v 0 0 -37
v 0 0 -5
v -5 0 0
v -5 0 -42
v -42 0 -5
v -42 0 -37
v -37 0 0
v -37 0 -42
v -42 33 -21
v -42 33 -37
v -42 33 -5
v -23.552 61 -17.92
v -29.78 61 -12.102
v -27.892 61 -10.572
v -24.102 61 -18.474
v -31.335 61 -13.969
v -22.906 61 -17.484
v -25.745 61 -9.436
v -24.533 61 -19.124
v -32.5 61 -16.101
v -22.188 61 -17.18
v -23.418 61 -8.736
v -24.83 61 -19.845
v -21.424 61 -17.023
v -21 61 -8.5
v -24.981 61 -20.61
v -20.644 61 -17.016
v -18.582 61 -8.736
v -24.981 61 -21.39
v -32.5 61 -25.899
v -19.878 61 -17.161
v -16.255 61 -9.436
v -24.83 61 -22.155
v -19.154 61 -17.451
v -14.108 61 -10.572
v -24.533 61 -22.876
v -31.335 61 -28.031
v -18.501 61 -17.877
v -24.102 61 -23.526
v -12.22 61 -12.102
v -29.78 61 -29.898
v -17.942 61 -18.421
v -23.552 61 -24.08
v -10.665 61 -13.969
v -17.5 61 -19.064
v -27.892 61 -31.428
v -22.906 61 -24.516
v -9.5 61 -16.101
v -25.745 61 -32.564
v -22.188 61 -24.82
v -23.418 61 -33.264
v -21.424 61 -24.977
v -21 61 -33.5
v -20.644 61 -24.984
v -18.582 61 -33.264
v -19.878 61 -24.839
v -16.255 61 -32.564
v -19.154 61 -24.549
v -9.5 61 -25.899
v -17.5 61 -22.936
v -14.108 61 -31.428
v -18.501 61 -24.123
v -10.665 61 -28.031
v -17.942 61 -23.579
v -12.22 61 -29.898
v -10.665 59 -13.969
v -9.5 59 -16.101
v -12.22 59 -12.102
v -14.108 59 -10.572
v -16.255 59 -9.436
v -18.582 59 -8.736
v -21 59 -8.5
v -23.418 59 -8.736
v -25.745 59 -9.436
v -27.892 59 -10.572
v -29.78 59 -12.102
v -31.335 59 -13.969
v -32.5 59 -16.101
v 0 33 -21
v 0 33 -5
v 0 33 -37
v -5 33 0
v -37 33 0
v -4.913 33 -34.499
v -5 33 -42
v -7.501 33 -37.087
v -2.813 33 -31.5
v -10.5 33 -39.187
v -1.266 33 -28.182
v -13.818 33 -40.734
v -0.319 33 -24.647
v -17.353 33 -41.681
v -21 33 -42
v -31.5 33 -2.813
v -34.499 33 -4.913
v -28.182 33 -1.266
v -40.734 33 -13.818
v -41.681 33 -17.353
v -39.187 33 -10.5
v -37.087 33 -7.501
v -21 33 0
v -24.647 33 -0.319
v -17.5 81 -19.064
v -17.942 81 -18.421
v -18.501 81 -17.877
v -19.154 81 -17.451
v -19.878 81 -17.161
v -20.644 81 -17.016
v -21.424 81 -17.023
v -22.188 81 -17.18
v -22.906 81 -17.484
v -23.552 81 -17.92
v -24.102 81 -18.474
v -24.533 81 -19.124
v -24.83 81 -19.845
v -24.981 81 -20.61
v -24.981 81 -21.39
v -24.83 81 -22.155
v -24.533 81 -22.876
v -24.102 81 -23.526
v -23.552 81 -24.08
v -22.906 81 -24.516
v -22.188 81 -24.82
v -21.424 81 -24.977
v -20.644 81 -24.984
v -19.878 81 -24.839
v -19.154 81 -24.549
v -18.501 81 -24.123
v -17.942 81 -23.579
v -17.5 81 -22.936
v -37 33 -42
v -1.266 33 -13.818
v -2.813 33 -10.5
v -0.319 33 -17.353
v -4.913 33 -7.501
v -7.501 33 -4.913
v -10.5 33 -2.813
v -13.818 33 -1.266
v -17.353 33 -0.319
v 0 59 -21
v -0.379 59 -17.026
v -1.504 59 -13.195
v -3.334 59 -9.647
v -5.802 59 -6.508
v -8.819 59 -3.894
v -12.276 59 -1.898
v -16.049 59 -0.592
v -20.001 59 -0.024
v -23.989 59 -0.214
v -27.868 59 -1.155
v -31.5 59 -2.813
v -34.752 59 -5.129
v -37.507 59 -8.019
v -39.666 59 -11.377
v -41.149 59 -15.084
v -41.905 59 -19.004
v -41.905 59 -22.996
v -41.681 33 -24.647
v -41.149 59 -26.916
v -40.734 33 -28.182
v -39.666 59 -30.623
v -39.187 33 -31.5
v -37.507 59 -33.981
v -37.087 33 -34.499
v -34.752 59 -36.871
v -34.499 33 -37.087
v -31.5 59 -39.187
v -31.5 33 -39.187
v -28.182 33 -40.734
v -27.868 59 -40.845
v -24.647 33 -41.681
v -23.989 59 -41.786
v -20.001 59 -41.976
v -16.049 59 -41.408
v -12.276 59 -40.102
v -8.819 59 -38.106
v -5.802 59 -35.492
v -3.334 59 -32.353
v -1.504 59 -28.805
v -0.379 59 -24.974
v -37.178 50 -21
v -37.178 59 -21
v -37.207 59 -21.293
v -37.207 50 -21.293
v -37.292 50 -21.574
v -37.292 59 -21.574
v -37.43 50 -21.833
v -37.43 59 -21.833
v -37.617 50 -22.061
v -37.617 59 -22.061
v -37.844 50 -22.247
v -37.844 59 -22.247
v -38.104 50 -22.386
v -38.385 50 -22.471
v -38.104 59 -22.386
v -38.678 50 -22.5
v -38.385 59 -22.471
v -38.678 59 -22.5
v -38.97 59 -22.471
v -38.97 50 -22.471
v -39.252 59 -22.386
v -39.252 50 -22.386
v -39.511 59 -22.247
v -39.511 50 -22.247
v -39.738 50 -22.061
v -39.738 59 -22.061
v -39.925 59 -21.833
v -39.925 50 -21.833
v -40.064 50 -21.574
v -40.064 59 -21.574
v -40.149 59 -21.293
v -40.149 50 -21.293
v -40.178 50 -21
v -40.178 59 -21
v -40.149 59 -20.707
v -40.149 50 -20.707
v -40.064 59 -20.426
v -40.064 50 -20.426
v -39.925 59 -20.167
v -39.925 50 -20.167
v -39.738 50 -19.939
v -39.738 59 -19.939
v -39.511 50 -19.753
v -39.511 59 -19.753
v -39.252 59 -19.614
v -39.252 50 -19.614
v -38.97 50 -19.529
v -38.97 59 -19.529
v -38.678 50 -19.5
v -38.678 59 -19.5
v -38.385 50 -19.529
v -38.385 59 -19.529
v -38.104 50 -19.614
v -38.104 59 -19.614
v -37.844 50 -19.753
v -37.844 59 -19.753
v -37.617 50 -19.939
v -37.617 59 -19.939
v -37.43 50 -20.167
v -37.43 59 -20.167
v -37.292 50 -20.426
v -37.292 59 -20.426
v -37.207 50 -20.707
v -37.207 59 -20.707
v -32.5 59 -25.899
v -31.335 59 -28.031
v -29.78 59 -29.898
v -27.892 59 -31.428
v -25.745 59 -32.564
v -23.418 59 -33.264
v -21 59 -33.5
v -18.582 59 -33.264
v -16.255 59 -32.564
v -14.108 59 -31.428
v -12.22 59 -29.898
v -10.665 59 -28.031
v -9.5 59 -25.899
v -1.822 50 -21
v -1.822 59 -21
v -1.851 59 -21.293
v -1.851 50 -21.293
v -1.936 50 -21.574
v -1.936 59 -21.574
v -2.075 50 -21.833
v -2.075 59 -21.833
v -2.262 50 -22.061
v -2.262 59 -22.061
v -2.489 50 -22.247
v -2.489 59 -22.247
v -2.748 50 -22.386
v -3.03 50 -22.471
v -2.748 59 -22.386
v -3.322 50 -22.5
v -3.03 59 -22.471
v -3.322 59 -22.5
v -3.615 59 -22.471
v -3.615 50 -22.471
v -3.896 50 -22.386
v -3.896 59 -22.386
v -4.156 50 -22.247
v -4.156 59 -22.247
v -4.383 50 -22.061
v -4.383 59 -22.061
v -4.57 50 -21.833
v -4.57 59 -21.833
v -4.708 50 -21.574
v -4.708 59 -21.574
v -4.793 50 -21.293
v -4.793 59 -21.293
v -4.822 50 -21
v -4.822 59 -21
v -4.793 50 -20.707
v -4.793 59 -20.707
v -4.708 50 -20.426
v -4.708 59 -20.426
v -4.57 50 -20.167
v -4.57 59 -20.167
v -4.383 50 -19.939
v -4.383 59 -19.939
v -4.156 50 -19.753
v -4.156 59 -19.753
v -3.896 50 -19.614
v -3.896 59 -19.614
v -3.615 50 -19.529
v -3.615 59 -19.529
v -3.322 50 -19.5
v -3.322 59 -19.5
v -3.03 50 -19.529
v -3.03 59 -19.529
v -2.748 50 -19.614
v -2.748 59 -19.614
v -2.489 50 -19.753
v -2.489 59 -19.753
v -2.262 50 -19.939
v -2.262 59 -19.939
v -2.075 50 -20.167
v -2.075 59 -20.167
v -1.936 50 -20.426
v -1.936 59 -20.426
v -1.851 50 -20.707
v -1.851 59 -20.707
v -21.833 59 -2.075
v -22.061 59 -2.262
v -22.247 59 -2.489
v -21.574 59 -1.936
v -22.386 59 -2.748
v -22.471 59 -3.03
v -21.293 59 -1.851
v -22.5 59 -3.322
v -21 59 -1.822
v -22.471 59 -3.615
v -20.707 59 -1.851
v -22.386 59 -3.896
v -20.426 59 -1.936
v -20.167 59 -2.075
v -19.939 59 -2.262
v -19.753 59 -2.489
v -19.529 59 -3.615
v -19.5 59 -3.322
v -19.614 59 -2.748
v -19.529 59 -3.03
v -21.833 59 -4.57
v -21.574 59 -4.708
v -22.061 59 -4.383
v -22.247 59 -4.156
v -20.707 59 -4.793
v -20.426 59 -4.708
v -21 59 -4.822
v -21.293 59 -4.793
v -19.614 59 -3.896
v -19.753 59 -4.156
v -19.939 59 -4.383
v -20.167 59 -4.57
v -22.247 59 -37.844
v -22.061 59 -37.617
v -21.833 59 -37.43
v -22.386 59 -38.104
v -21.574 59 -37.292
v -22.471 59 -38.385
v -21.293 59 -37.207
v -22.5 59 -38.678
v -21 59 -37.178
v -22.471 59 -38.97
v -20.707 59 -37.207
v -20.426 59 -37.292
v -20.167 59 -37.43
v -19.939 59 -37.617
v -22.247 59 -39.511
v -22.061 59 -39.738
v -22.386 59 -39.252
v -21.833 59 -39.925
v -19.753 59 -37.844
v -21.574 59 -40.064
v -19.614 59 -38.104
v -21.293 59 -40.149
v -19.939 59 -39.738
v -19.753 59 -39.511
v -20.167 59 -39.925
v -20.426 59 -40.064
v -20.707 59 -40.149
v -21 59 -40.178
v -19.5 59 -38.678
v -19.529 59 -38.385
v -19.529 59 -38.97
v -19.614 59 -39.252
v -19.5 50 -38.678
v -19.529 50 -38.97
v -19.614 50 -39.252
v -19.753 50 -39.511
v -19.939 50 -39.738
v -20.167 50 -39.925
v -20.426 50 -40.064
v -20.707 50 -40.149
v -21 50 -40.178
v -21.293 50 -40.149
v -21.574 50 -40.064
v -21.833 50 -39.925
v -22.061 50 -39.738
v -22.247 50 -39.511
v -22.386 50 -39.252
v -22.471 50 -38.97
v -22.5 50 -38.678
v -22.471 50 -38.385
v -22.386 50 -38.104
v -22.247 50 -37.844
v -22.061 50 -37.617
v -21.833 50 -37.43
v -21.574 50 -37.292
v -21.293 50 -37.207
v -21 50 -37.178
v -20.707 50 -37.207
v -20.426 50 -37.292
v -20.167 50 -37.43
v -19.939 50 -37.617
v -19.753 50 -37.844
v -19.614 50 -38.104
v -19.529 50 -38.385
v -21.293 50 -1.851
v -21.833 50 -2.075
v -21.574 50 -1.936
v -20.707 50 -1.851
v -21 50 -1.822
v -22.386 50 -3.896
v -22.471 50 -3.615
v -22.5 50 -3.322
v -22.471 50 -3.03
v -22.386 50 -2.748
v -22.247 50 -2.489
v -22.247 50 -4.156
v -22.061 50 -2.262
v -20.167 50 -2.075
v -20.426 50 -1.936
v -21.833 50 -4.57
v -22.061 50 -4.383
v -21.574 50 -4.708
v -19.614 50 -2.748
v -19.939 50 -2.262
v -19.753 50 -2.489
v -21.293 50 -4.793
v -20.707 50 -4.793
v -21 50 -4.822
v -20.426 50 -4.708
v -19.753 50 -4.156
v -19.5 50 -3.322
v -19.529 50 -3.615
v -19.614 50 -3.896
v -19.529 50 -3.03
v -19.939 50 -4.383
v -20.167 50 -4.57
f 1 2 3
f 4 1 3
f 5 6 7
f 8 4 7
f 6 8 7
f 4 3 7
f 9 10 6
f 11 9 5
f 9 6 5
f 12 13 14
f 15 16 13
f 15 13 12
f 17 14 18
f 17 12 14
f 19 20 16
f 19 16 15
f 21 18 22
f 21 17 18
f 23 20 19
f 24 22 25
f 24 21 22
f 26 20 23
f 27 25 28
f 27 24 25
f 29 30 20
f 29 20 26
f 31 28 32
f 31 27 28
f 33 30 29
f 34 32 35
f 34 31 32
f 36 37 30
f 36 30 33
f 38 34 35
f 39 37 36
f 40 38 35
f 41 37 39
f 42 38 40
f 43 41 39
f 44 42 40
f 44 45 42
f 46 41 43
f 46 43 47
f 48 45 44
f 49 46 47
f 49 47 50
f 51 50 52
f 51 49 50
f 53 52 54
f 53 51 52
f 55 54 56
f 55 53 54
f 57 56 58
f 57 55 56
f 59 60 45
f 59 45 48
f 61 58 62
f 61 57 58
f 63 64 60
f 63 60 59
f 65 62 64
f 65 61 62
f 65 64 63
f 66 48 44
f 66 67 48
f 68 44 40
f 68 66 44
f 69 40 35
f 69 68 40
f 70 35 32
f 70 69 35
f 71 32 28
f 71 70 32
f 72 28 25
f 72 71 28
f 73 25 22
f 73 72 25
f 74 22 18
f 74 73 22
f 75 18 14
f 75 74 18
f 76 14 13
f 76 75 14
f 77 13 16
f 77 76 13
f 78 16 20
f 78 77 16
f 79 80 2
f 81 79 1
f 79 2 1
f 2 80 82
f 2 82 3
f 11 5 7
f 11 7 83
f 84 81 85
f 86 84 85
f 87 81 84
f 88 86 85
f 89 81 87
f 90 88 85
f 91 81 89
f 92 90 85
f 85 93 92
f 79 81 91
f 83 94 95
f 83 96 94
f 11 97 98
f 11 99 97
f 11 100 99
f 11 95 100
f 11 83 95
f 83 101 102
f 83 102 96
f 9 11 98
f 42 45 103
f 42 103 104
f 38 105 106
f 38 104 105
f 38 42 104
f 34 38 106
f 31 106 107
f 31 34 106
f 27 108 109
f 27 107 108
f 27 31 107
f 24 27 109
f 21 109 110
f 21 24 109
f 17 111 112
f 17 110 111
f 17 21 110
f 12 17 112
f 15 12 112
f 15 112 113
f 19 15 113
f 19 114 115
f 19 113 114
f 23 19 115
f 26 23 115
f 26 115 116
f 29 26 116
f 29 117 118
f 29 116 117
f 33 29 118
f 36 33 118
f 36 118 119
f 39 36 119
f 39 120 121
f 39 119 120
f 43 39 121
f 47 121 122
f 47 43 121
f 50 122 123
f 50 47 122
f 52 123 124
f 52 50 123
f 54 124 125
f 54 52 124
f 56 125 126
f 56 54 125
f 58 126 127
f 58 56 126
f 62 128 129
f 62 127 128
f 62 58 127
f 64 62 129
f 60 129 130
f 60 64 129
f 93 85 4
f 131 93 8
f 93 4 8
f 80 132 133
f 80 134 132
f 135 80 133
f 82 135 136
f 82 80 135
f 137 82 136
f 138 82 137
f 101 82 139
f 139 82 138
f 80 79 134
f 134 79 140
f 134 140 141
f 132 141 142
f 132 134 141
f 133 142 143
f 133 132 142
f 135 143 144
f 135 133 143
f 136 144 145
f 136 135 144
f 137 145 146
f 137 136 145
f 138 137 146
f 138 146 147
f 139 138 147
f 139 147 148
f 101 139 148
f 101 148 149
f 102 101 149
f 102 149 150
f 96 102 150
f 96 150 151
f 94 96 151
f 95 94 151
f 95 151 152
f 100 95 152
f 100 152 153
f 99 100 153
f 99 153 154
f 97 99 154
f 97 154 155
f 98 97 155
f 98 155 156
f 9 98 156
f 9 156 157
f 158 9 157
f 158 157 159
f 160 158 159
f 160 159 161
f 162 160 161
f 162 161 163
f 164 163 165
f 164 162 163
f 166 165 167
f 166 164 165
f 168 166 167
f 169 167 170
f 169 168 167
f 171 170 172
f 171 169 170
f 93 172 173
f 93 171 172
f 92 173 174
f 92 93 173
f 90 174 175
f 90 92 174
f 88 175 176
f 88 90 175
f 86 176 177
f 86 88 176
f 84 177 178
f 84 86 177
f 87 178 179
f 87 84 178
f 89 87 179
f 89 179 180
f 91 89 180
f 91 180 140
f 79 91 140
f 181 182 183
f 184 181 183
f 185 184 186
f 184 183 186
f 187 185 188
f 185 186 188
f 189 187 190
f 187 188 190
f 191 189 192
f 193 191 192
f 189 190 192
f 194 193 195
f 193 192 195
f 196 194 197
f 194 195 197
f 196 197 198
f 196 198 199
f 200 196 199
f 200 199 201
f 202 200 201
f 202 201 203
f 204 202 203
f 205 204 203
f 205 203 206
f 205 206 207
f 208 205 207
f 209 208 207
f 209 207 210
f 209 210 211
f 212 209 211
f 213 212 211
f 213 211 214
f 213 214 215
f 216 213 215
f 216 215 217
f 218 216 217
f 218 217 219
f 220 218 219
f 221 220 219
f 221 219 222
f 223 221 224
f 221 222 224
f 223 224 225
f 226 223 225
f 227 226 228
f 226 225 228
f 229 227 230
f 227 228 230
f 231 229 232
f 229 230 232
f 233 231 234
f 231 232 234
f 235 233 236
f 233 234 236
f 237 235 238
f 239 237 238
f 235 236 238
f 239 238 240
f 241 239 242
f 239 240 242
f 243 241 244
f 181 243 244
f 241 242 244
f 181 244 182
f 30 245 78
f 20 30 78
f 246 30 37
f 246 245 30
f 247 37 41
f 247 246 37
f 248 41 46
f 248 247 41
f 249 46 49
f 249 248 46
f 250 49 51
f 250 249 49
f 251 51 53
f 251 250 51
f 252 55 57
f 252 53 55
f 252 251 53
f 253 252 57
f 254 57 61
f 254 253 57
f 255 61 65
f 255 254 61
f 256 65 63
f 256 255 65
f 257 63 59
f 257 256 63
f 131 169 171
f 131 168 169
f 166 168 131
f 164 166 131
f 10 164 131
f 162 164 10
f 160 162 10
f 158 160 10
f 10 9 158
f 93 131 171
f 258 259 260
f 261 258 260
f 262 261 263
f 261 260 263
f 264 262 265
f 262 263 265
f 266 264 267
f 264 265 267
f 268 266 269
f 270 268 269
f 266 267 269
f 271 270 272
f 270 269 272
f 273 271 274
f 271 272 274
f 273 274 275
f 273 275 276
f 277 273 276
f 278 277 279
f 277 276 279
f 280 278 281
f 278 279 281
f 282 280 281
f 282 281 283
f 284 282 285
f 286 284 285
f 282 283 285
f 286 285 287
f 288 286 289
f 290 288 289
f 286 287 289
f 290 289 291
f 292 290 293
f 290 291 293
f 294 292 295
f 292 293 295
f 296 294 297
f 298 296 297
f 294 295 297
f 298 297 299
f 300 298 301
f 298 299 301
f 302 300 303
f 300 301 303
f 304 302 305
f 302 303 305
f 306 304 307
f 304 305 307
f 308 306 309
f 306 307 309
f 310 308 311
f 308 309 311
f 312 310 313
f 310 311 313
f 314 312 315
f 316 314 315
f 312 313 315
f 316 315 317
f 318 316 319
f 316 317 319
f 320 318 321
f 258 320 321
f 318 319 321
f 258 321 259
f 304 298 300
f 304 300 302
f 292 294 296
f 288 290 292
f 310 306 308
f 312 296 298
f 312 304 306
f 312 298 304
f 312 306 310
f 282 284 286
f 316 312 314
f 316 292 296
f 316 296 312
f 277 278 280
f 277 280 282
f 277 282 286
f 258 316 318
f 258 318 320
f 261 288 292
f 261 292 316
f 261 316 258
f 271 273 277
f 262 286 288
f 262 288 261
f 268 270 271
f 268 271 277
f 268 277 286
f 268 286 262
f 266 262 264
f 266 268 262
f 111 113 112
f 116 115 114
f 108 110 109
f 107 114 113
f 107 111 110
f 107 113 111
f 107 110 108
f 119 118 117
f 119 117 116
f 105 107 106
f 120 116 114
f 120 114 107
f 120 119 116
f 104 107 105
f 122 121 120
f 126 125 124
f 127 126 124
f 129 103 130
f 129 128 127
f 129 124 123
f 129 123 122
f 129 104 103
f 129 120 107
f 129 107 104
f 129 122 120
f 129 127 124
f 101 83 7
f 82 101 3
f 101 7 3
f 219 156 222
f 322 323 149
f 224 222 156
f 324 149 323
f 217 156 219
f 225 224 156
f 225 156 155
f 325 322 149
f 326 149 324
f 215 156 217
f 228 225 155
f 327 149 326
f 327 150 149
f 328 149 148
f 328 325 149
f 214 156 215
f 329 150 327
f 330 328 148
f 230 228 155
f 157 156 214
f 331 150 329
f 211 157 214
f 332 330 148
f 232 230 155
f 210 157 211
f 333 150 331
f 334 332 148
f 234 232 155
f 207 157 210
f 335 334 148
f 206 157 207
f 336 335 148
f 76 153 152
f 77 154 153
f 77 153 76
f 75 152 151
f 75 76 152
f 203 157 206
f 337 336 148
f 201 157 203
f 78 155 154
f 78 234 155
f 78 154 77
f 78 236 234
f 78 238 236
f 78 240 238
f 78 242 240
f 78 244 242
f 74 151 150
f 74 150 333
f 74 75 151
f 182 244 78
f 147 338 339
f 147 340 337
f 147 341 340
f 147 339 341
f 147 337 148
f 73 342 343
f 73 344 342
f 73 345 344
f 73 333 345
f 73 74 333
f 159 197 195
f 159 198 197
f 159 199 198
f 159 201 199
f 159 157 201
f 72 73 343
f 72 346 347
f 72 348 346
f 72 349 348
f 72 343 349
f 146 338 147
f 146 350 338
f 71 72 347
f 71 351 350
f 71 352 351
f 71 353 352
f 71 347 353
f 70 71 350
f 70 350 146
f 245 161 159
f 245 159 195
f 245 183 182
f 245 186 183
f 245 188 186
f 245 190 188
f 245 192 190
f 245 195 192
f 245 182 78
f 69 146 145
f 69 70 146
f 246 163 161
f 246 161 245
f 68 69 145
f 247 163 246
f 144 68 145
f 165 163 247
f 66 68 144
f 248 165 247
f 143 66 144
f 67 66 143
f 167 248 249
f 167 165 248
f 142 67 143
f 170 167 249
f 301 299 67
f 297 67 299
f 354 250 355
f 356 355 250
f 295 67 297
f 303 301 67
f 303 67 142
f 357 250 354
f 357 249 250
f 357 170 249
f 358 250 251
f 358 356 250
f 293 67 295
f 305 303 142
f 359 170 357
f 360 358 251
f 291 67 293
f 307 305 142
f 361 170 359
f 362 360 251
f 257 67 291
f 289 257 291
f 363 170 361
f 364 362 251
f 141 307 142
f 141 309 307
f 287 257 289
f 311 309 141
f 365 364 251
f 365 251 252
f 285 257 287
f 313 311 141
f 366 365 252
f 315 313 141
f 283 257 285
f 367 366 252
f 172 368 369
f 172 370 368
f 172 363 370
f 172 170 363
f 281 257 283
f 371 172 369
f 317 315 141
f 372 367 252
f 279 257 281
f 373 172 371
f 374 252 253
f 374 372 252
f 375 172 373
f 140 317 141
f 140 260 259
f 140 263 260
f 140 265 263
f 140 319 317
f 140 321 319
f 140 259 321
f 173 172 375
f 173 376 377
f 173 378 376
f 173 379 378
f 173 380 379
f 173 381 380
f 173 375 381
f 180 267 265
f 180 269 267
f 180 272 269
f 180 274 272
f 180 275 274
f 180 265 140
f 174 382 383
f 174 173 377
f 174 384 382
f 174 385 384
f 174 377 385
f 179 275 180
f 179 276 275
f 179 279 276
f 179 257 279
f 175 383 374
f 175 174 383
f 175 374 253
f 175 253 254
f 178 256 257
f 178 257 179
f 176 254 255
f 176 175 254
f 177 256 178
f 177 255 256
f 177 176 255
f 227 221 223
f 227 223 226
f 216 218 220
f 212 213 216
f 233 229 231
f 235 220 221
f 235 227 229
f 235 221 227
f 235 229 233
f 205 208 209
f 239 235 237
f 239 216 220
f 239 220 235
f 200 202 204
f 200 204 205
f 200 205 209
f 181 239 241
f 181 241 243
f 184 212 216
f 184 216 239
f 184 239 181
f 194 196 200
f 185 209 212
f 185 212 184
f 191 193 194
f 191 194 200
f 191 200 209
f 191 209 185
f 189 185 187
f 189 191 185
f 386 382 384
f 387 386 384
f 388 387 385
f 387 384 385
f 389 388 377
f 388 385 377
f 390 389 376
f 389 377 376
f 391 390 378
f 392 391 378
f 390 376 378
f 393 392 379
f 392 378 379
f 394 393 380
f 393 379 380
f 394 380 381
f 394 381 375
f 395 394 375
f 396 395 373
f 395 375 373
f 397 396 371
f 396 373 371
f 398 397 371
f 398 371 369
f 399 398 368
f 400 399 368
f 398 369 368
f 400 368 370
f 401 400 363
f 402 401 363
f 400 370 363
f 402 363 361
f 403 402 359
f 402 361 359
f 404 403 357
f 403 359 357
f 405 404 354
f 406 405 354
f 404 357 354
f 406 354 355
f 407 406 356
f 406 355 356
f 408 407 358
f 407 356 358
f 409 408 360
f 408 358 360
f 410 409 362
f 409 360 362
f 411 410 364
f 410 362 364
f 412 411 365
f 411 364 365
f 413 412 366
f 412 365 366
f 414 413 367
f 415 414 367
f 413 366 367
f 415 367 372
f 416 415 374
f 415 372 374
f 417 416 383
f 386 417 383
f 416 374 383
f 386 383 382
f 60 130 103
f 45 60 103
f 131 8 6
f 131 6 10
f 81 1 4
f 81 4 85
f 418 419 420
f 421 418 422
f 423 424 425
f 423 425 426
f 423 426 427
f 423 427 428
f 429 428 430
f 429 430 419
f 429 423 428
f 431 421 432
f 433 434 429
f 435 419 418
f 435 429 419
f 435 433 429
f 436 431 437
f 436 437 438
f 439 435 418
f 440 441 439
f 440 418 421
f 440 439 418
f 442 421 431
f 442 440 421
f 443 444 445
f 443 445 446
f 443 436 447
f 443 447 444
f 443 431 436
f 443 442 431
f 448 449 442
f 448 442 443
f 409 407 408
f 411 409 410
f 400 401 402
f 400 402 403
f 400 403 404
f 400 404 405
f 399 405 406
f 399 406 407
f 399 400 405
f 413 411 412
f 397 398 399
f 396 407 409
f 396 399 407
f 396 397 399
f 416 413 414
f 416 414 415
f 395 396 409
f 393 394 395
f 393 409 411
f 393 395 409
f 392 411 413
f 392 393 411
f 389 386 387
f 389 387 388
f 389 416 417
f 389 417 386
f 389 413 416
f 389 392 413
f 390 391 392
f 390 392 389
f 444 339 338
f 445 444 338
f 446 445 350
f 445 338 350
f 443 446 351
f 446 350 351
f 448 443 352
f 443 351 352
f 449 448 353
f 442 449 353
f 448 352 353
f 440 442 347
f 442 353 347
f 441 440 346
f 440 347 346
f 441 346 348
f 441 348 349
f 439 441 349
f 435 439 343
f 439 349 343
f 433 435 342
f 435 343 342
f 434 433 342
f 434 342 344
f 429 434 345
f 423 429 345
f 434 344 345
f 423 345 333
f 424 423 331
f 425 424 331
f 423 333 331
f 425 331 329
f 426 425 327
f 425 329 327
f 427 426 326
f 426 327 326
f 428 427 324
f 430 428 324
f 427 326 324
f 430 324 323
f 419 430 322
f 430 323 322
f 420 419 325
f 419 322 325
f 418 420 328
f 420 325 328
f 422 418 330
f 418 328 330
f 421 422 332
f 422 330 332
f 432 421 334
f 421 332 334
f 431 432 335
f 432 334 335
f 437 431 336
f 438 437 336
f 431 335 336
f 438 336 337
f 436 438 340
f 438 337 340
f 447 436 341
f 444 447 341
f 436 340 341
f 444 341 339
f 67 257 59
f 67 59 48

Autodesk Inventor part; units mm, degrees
ref_plane "YZ Plane" through (0, 0, 0) normal (1, 0, 0) x (0, 1, 0)
ref_plane "XZ Plane" through (0, 0, 0) normal (0, 1, 0) x (-1, 0, 0)
ref_plane "XY Plane" through (0, 0, 0) normal (0, 0, 1) x (1, 0, 0)
sketch "Sketch1" plane through (0, 0, 0) normal (0, 1, 0) x (-1, 0, 0)
  line L0 (0, 0) -> (0, -42)
  line L1 (0, -42) -> (42, -42)
  line L2 (42, -42) -> (42, 0)
  line L3 (42, 0) -> (0, 0)
  dimension "d0" = 42
  dimension "d1" = 42
extrude "Extrusion1" add sketch "Sketch1" along normal blind 33
chamfer "Chamfer1" distance 5 angle 45 4 edges at (0, 16.5, 0) (-42, 16.5, 0) (-42, 16.5, -42) (0, 16.5, -42)
sketch "Sketch2" plane through (0, 33, 0) normal (0, 1, 0) x (1, 0, 0)
  line L0 (-5, 42) -> (-37, 42) projected
  line L1 (0, 5) -> (0, 37) projected
  circle A0 centre (-21, 21) radius 21
  point P0 (0, 0)
  dimension "d7" = 42
  dimension "d8" = 21
  dimension "d9" = 21
extrude "Extrusion2" add sketch "Sketch2" along normal blind 26
sketch "Sketch3" plane through (-21, 59, -21) normal (0, 1, 0) x (1, 0, 0)
  circle A0 centre (0, 0) radius 21 projected
  line L0 (11.5, 4.899) -> (11.5, -4.899)
  line L1 (-11.5, 4.899) -> (-11.5, -4.899)
  arc A1 (-11.5, -4.899) -> (11.5, -4.899) centre (0, 0) ccw
  arc A2 (11.5, 4.899) -> (-11.5, 4.899) centre (0, 0) ccw
  point P0 (21, -21)
  dimension "d13" = 11.5
  dimension "d14" = 11.5
  dimension "d15" = 12.5
  dimension "d16" = 12.5
extrude "Extrusion3" add sketch "Sketch3" along normal blind 2 contours L0 A1 L1 A2
sketch "Sketch4" plane through (-21, 61, -21) normal (0, 1, 0) x (1, 0, 0)
  arc A0 (11.5, 4.899) -> (-11.5, 4.899) centre (0, 0) ccw projected
  arc A1 (-11.5, -4.899) -> (11.5, -4.899) centre (0, 0) ccw projected
  arc A2 (3.5, 1.9365) -> (3.5, -1.9365) centre (0, 0) ccw
  line L0 (3.5, 1.9365) -> (3.5, -1.9365)
  point P0 (21, -21)
  dimension "d19" = 8
  dimension "d20" = 3.5
extrude "Extrusion4" add sketch "Sketch4" along normal blind 20
sketch "Sketch5" plane through (-21, 59, -21) normal (0, 1, 0) x (1, 0, 0)
  arc A0 (-11.5, -4.899) -> (11.5, -4.899) centre (0, 0) ccw projected
  circle A1 centre (0, -17.6777) radius 1.5
  circle A2 centre (17.6777, 0) radius 1.5
  circle A3 centre (0, 17.6777) radius 1.5
  circle A4 centre (-17.6777, 0) radius 1.5
  point P0 (21, -21)
  dimension "d23" = 3
  dimension "d26" = 25
  dimension "d27" = 25
  dimension "d29" = 17.6777
  dimension "d30" = 17.6777
  dimension "d31" = 17.6777
  dimension "d32" = 17.6777
extrude "Extrusion5" cut sketch "Sketch5" against normal blind 9
thread "Thread1" size "M3x0.5" class "6H" standard "ANSI Metric M Profile" full length
thread "Thread2" size "M3x0.5" class "6H" standard "ANSI Metric M Profile" full length
thread "Thread3" size "M3x0.5" class "6H" standard "ANSI Metric M Profile" full length
thread "Thread4" size "M3x0.5" class "6H" standard "ANSI Metric M Profile" full length
equation "\"d30\" = d29"
equation "\"d32\" = d31"
properties part number "StepperMotorNema17Geared" material "Aluminum 6061"
